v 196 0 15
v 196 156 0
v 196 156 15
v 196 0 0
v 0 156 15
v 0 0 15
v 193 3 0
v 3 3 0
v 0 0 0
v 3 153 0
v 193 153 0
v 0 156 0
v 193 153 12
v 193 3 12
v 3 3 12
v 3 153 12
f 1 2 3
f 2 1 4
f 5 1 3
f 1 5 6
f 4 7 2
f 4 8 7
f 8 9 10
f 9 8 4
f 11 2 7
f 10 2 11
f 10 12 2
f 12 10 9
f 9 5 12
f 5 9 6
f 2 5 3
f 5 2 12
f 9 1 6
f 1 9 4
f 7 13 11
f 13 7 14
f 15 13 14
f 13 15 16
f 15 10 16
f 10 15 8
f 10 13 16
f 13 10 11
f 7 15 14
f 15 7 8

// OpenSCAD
// TEMPLATE ONLY. Measure and edit before printing. Millimetres.
difference(){union(){
translate([0, 0, 0]) cube([196, 156, 15]);
}
translate([3, 3, -1]) cube([190, 150, 13]);
}
